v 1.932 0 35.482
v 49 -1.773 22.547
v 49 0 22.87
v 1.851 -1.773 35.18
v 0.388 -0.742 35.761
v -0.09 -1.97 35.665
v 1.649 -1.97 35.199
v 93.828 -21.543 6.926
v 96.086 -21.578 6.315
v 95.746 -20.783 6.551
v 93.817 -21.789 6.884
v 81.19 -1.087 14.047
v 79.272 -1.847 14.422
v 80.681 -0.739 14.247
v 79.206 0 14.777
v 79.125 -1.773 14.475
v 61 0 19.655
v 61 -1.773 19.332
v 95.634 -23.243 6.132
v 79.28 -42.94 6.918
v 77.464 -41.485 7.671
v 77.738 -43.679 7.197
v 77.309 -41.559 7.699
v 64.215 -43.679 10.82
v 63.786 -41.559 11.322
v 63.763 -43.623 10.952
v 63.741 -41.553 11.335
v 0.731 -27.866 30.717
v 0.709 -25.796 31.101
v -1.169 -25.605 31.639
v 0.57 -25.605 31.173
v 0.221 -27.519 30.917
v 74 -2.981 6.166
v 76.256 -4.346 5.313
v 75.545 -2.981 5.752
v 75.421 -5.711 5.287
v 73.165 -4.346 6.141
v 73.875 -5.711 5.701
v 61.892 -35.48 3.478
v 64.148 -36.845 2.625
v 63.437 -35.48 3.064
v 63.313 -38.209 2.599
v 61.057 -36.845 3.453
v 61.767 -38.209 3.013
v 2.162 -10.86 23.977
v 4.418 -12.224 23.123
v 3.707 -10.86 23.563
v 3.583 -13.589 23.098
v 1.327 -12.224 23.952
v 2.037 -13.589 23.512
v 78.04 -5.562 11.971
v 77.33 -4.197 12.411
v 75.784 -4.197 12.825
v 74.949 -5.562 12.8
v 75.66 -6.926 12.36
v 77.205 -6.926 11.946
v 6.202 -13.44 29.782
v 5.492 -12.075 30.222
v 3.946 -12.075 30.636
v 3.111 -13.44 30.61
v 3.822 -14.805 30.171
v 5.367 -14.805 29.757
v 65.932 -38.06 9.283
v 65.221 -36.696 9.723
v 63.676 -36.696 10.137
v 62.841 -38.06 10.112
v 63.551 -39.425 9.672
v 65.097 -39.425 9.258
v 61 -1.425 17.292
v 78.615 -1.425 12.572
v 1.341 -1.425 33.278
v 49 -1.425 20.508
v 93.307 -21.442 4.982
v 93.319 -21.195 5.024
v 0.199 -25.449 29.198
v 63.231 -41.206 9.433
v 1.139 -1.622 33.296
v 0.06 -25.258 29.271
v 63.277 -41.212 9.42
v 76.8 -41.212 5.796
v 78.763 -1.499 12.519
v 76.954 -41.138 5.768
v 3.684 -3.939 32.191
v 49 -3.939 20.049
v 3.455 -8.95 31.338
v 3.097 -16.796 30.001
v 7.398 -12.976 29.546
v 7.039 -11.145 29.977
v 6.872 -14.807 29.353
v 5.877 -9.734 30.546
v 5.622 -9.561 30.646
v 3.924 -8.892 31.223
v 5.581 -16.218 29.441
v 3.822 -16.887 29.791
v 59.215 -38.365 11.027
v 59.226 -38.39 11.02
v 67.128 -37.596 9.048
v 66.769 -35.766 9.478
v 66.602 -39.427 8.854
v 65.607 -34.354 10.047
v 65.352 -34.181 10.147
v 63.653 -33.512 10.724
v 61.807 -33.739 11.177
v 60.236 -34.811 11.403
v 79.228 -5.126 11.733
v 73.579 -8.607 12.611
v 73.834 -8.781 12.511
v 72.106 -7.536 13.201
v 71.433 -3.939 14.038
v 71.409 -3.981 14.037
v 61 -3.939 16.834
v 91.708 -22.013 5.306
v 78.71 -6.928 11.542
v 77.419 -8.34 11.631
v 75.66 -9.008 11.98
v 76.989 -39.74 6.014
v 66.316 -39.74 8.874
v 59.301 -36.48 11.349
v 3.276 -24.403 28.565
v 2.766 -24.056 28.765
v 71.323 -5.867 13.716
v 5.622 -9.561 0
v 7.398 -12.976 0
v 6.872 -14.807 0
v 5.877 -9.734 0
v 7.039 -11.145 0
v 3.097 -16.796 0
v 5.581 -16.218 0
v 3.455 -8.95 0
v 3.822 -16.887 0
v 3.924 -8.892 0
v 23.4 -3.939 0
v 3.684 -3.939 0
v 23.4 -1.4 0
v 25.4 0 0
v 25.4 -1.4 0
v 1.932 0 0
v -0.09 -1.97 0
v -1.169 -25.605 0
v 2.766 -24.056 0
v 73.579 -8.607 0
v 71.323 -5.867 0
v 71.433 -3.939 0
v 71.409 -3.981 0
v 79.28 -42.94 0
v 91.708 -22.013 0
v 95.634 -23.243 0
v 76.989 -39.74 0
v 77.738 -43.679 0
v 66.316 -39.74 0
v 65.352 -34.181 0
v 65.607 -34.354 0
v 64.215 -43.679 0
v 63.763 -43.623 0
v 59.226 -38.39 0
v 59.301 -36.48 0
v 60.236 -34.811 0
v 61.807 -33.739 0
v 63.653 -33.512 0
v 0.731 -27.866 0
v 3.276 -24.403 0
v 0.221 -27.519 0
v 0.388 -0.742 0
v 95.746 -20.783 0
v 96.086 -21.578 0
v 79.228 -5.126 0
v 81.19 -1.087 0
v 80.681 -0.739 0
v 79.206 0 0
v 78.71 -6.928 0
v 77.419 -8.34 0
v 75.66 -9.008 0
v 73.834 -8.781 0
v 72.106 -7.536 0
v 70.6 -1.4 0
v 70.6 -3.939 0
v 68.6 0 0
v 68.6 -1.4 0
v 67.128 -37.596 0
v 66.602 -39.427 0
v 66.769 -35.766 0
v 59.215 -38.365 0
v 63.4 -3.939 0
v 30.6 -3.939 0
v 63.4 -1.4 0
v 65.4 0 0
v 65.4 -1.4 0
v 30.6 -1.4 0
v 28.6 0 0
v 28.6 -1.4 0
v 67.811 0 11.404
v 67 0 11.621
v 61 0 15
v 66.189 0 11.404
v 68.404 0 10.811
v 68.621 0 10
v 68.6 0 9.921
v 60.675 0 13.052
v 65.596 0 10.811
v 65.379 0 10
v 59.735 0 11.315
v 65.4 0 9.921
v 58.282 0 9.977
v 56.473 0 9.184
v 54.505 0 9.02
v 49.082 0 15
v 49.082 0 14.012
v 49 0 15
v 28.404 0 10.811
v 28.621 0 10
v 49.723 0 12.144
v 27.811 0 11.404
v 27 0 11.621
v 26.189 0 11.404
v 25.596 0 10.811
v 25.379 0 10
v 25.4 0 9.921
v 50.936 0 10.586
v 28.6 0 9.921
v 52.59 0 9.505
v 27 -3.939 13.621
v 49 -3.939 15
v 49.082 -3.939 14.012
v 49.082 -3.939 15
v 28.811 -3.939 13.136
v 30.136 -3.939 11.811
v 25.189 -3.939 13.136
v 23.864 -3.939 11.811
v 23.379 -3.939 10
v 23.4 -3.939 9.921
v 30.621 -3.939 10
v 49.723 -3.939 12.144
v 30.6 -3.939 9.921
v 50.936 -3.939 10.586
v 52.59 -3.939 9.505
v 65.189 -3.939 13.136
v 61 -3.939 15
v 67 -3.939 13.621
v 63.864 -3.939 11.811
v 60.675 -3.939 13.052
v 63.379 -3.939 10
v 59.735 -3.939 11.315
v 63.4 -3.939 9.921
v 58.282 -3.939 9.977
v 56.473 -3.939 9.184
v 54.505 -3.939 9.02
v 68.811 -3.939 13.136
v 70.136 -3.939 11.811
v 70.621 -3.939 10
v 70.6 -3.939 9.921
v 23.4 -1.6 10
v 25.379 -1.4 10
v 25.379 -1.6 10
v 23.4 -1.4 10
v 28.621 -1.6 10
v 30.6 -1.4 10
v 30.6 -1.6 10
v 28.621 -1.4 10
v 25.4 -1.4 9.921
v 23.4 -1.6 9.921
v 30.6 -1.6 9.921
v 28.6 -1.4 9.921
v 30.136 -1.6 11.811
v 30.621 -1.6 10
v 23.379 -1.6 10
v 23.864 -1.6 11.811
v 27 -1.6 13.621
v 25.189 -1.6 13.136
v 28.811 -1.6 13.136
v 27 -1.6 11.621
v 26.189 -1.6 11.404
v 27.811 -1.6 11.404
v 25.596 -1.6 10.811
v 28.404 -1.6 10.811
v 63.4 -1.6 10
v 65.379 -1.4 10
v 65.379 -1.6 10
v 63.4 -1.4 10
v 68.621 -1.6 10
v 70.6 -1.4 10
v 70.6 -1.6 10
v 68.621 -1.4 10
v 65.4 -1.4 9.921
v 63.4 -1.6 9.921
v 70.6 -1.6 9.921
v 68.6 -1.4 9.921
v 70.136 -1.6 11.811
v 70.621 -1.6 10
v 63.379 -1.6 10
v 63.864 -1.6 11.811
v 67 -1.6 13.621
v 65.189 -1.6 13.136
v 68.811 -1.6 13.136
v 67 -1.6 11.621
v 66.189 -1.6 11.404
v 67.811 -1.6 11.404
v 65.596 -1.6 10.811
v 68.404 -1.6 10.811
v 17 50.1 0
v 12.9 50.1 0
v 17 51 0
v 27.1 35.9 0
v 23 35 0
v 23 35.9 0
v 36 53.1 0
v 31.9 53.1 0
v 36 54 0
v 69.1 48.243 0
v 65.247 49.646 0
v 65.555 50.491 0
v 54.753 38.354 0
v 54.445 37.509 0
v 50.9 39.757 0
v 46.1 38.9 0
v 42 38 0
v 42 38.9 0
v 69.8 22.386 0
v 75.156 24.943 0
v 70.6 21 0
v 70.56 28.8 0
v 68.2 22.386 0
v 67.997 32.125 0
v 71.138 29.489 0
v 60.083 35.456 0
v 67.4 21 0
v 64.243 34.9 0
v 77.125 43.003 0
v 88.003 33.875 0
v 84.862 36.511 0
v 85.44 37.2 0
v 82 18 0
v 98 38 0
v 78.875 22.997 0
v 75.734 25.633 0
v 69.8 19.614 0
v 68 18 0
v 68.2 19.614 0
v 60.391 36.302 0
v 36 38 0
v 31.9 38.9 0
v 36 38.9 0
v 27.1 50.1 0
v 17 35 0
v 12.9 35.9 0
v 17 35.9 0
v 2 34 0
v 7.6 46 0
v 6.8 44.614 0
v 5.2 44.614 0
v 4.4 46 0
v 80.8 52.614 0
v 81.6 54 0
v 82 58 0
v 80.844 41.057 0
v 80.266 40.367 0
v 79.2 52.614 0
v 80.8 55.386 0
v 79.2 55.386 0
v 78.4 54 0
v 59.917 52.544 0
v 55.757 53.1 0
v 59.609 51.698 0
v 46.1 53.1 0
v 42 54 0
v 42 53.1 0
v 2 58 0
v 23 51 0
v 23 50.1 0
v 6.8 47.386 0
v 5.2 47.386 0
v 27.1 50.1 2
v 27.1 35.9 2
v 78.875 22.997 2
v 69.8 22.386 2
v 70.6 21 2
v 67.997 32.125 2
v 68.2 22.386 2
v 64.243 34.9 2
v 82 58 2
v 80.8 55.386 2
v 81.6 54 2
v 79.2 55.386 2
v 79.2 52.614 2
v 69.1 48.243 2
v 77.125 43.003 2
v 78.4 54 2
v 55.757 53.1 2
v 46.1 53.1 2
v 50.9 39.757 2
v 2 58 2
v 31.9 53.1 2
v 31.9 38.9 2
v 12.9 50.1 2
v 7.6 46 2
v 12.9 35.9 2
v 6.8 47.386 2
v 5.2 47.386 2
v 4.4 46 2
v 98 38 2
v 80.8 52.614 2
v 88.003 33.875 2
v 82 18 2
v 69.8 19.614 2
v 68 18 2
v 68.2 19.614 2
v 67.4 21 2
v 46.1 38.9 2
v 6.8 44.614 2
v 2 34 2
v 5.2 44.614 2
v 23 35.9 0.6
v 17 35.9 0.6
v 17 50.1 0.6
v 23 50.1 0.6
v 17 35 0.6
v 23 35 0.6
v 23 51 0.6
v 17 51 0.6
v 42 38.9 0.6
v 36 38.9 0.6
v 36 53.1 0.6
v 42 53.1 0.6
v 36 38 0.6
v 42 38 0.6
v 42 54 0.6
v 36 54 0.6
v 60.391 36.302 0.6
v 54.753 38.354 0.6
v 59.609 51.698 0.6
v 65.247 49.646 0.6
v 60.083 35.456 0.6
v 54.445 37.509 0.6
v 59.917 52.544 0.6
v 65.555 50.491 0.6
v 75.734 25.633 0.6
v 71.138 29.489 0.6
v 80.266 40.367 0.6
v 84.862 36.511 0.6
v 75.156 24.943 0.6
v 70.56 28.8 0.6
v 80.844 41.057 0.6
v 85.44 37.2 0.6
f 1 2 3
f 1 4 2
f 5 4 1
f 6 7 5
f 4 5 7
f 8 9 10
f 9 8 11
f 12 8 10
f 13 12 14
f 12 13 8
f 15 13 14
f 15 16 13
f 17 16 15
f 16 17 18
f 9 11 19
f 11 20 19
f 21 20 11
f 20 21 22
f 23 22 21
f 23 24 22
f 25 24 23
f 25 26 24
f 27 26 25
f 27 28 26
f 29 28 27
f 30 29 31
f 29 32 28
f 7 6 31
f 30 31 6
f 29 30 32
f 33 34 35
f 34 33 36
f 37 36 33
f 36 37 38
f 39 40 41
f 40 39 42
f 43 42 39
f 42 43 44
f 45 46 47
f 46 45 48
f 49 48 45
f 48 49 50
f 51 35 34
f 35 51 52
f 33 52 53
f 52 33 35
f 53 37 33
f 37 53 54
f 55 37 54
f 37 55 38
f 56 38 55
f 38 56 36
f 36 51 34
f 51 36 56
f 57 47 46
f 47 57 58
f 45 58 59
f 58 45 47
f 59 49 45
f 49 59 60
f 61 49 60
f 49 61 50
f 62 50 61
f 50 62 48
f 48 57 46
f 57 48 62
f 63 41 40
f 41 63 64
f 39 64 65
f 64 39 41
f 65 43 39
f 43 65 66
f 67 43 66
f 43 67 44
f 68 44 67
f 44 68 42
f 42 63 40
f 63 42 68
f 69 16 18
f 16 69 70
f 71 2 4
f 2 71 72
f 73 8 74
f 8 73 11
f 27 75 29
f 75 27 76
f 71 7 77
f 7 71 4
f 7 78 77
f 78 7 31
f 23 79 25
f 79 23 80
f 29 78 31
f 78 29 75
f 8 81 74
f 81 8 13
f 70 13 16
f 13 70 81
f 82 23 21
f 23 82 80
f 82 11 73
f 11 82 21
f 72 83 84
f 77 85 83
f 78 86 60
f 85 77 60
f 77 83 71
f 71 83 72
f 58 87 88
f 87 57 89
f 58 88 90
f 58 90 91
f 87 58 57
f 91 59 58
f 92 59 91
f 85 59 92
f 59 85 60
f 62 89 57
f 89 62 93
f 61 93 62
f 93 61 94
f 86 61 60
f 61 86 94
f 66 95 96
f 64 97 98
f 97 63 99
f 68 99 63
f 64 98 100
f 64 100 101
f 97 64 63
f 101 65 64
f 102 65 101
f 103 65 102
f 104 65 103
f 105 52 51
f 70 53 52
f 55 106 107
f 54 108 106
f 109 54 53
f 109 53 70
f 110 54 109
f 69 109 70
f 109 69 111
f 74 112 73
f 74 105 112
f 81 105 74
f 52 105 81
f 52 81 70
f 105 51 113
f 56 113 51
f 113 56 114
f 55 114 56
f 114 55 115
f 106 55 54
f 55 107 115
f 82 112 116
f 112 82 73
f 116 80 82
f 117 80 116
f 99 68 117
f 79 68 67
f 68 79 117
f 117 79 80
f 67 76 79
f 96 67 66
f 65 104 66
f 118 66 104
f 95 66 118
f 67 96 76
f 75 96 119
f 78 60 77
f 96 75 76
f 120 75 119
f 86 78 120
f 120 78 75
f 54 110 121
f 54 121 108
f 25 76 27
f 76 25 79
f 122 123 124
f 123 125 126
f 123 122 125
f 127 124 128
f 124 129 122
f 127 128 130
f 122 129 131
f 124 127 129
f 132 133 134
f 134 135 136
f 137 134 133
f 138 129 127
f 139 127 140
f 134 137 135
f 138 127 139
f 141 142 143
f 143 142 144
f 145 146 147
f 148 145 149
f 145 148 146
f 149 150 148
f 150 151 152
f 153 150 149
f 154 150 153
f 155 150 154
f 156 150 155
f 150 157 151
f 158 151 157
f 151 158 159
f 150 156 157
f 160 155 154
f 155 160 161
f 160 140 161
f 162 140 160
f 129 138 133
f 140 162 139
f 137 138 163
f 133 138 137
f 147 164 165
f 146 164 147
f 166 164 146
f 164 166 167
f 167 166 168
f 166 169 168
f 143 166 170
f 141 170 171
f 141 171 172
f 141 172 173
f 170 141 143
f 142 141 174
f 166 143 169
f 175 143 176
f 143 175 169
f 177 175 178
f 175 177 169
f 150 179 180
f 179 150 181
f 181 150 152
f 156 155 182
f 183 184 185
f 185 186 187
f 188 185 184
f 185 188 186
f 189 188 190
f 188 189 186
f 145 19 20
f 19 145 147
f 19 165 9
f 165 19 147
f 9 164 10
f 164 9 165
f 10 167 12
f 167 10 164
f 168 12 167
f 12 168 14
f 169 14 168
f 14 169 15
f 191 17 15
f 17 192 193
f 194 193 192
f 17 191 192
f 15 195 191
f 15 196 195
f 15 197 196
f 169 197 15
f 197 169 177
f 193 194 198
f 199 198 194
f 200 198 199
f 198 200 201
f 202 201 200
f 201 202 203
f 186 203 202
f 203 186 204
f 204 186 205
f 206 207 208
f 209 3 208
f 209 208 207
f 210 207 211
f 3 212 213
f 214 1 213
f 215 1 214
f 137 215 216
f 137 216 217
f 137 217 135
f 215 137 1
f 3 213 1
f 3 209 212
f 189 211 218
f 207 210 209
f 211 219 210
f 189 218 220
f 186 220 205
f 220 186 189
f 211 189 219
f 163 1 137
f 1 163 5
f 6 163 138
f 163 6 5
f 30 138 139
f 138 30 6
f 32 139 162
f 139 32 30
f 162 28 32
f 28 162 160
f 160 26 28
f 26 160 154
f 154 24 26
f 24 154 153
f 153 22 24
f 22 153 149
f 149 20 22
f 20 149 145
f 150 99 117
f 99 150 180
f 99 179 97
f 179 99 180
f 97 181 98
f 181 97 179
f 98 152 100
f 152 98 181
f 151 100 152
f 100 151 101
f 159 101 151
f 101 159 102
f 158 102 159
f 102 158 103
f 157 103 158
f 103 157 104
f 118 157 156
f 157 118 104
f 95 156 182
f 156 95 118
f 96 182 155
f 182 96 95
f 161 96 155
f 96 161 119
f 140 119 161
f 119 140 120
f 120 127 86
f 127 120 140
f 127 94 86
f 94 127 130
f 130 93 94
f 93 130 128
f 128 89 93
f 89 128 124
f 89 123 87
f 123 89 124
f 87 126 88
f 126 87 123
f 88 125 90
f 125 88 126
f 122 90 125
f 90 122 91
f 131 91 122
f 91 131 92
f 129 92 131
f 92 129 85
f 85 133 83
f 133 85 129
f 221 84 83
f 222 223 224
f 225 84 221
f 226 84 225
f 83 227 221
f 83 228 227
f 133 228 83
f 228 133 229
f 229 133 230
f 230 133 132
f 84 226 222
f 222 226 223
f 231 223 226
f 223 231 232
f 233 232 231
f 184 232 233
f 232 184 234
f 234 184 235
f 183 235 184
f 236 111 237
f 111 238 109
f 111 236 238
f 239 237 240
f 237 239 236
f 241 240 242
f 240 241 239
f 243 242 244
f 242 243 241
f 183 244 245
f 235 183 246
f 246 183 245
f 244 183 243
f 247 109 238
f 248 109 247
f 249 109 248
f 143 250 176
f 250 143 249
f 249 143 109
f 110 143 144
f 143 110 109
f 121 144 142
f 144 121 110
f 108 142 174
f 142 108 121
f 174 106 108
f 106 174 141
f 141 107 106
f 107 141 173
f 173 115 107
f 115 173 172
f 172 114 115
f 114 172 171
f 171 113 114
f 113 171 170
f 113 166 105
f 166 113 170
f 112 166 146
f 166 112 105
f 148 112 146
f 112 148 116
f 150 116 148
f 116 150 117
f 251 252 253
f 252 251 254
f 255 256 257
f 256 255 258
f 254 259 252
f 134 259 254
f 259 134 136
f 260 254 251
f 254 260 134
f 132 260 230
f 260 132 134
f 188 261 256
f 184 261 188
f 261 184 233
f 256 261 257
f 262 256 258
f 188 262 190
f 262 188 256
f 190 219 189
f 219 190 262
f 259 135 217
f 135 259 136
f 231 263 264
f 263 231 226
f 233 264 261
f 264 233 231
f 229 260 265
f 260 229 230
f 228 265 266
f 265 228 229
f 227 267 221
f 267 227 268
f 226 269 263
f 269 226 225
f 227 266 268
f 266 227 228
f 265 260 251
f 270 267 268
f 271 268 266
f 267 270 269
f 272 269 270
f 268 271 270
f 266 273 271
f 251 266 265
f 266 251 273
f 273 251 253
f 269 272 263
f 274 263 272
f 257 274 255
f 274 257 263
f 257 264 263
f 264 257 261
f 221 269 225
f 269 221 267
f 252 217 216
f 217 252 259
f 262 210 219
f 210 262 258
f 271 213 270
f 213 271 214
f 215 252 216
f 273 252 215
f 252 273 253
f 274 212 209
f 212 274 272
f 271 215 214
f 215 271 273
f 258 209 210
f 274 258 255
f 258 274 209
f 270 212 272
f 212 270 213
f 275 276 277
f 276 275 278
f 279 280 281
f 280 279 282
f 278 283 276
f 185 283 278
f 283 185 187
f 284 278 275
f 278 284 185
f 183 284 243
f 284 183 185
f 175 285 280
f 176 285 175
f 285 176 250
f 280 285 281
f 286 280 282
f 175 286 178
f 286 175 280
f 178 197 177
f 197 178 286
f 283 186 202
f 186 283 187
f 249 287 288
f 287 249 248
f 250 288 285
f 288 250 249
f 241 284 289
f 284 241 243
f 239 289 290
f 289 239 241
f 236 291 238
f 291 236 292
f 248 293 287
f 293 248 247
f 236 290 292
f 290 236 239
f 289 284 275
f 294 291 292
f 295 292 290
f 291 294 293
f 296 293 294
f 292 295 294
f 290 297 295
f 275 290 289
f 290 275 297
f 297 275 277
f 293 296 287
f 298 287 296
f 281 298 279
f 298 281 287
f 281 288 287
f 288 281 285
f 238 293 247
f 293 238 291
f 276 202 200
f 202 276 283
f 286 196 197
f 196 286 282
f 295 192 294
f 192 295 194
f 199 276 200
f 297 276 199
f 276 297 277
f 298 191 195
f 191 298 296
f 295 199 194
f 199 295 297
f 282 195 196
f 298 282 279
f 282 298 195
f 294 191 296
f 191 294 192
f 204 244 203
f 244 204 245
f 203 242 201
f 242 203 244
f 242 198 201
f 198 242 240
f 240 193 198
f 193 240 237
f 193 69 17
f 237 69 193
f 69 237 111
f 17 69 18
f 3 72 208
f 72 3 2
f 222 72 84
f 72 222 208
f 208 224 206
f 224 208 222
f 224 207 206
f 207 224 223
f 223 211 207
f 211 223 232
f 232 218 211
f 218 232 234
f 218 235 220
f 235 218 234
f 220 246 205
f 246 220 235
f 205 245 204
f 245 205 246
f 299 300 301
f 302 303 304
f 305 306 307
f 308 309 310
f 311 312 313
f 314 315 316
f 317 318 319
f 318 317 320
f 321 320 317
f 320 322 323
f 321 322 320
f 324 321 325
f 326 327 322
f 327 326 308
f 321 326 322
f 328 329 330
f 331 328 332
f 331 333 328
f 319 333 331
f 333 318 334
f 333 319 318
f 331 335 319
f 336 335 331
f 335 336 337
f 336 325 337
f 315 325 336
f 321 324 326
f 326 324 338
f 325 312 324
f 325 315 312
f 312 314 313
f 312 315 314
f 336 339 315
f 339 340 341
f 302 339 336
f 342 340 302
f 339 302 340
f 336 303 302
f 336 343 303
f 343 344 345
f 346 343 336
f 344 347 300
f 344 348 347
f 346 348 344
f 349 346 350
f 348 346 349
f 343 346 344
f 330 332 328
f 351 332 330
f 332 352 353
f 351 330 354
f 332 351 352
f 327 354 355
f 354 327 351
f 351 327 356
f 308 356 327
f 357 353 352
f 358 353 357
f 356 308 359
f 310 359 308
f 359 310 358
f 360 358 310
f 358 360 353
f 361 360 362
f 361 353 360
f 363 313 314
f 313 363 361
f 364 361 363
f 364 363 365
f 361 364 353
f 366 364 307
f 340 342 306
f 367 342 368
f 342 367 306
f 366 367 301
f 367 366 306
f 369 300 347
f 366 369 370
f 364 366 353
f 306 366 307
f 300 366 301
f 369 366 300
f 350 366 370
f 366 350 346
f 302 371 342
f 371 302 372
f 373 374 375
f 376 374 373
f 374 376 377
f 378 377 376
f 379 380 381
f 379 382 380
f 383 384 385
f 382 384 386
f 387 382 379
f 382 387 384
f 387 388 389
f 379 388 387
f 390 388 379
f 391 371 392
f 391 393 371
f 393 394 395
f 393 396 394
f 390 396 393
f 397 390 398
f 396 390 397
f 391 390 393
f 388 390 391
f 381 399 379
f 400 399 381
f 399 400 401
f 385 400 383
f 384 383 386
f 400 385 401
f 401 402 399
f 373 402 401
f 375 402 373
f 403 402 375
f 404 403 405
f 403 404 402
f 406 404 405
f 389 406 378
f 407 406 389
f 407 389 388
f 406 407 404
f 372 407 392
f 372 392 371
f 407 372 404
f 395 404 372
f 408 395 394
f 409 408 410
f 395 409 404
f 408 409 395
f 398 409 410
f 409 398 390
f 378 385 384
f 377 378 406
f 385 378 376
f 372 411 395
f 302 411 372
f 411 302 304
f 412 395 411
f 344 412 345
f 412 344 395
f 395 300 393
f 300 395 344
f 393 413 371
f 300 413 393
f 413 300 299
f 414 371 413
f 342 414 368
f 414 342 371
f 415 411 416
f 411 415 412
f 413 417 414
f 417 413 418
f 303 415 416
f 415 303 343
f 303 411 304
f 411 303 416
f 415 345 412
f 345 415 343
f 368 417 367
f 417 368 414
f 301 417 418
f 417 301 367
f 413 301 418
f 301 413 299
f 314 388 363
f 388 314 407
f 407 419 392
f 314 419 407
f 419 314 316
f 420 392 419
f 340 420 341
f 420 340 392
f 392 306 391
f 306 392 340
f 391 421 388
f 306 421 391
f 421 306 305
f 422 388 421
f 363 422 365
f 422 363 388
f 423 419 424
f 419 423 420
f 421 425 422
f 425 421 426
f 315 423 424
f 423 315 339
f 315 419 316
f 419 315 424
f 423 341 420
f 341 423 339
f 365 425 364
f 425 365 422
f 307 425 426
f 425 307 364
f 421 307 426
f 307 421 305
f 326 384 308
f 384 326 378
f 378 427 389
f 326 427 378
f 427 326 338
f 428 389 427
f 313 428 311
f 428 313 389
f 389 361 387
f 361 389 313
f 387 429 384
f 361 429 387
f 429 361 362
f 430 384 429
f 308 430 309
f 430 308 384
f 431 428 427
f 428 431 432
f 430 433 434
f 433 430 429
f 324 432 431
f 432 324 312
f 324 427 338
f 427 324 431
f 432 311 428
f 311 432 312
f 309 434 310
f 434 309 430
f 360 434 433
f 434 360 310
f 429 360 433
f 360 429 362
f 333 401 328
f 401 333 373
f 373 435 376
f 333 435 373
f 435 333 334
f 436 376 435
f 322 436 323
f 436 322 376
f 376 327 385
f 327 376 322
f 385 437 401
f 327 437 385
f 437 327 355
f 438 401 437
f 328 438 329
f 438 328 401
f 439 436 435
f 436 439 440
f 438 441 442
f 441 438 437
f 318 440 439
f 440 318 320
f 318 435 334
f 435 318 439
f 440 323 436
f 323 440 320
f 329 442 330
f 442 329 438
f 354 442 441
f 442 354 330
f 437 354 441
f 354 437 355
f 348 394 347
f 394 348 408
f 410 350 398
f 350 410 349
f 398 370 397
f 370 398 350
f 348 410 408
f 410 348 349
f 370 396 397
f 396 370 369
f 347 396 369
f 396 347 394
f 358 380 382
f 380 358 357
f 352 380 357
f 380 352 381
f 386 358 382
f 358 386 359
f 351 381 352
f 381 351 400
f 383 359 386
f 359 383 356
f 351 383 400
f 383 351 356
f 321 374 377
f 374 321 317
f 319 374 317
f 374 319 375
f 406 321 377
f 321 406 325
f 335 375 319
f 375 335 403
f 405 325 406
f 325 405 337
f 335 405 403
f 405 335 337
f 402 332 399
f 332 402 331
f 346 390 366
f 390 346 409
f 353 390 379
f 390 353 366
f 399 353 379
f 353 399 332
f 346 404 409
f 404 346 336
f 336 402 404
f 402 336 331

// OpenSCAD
// file: common.scad
cls = 0.20;

module keyswitch_hole(x=0, y=0, a=0) {
    translate([x, y, 0]) {
        rotate([0, 0, 90+a]) {
            linear_extrude(height = 2) {
            square([14+cls, 14+cls], center = true);
            }
            linear_extrude(height = 0.6) {
                translate([-3, 7]) square([6, 1]);
            translate([-3, -8]) square([6, 1]);
            }
        }
    }
}

keyswitch_hole();

module joint_male_face() {
    translate([-1, 0])
    square([2,4]);
    translate([-3, 2])
    square([6,2]);
}

module joint_male(pos=[0,0]) {
    translate(pos){
      rotate([0,0,180]){
        linear_extrude(height=10)
        joint_male_face();
        
        translate([0,2,10])
        rotate([-90,0,0])
        linear_extrude(height=2)
        circle(3, $fn=12);
        
        translate([0,0,10])
        rotate([-90,0,0])
        linear_extrude(height=2)
        circle(1, $fn=12);
      }
    }
}

module joint_female(pos=[0,0]) {
    delta = 0.6;
    translate(pos){
      rotate([0,0,180]){
        linear_extrude(height=10)
        offset(delta=delta)
        joint_male_face();
        
        translate([0,1.6,10])
        rotate([-90,0,0])
        linear_extrude(height=2.8)
        offset(delta=delta)
        circle(3, $fn=12);

        translate([0,-0.4,10])
        rotate([-90,0,0])
        linear_extrude(height=2.8)
        offset(delta=delta)
        circle(1, $fn=12);
      }
    }
}


joint_male([20, 0]);
joint_female([30, 0]);
// main file
use <common.scad>;

thumb_plate_points = [
                [2,  -26],
                [2,  -2],
                [82, -2],
                [98,-22],
                [82, -42],
                [68, -42],
                ];

thumb_plate_sc_points = [
                [2+4, -14],
                [82-2, -2-4],
                [71-2, -42+3],
                ];

module plate_nohole() {
    linear_extrude(height=2)
    polygon(points=thumb_plate_points);
}

module keyswitch_col(x=0,y=0,c=3,a=0) {
    translate([x,y])
    rotate([0,0,a])
    for (i = [0:c-1]) {
        keyswitch_hole(0, 19*i);
    }
}

module plate_holes() {
    keyswitch_hole(20, -14-3, 90);
    keyswitch_hole(39, -14, 90);
    keyswitch_hole(60, -16, 90-20);
    keyswitch_hole(78, -27, 90-40);

    for(p=thumb_plate_sc_points) {
        linear_extrude(height=5)
            translate(p)
            circle(1.6);
    }
}


module thumb_plate() {
    difference() {
        plate_nohole();
        plate_holes();
    }
}


tilt_angle = [10,15,0];
tilt_angle_r = tilt_angle * -1;
height = 36;

module thumb_case_outer_face() {
    projection()
        translate([0,0,height])
        rotate(tilt_angle)
        linear_extrude(height=2)
        offset(2)
        polygon(points=thumb_plate_points);
}

module thumb_case_inner_face() {
    projection()
        translate([0,0,height])
        rotate(tilt_angle)
        linear_extrude(height=2)
        offset(-2)
        polygon(points=thumb_plate_points);
}

module thumb_case_bottom_face() {
    difference(){
        thumb_case_outer_face();
        thumb_case_inner_face();
    }
    projection()
    translate([0,0,height])
    rotate(tilt_angle)
    for(p=thumb_plate_sc_points){
        linear_extrude(height=1)
        translate([-2,1])
        translate(p)
        circle(4);
    }
}

module case() {
    difference() {
        linear_extrude(height=50)
            thumb_case_bottom_face();
        translate([0,0,height])
            rotate(tilt_angle){
            linear_extrude(height=50)
                square(300, center=true);
            // screw hole
            translate([0,0,-9])
                linear_extrude(height=9)
                for(p=thumb_plate_sc_points){
                    translate(p)
                        circle(1.6);
                }
            // plate hole
            translate([0,0,-2])
            linear_extrude(height=2)
            offset(0.2)
            polygon(points=thumb_plate_points);
        }
    }
}

module thumb_case_hole() {
    // cable hole
    translate([55,0,0])
    rotate([90,0,0])
    linear_extrude(height=4){
        translate([0, 15])
        circle(6);
        translate([-6,15])
        square([12, 30]);
    }
    for (x = [27,67]) {
        joint_female([x, 0]);
    }
}

module thumb_case() {
    difference() {
        case();
        thumb_case_hole();
    }
}

thumb_case();

translate([0, 60])
thumb_plate();
